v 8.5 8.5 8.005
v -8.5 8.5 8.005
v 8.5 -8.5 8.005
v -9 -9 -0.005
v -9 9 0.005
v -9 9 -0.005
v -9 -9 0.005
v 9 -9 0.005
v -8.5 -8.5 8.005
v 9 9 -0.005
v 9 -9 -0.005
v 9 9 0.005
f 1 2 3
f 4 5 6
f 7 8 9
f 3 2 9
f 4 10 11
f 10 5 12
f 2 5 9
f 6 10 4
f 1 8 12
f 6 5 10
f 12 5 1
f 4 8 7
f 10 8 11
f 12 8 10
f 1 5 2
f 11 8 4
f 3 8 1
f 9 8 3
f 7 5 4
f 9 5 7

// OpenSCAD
$fs = 0.1;

global_thin_film_thickness = 0.01;

key_bottom_vertical = 18;
key_bottom_side = 18;
key_top_vertical = 17;
key_top_side = 17;
key_hight = 8;

stem_outer_diameter = 5.5;
stem_cross_hight = 4.0;
stem_cross_vertical = 1.25;
stem_cross_side = 1.10;

module keycap_stem (stem_cross_hight, stem_outer_diameter,stem_cross_vertical, stem_cross_side) {
  difference () {
    cylinder(d = stem_outer_diameter, h = 15);
    translate([0, 0, 15/2])
      cube(size = [stem_cross_vertical, stem_cross_length, 15], center = true);
    translate([0, 0, 15/2])
    cube(size = [stem_cross_length, stem_cross_side, 15], center = true);
  }
}

module keycap_shape () {
  hull() {
    translate([0,0,key_hight])
      cube([key_top_side,key_top_vertical,global_thin_film_thickness], center = true);
    cube([key_bottom_side,key_bottom_vertical,global_thin_film_thickness], center = true);
  }
}

keycap_shape();
